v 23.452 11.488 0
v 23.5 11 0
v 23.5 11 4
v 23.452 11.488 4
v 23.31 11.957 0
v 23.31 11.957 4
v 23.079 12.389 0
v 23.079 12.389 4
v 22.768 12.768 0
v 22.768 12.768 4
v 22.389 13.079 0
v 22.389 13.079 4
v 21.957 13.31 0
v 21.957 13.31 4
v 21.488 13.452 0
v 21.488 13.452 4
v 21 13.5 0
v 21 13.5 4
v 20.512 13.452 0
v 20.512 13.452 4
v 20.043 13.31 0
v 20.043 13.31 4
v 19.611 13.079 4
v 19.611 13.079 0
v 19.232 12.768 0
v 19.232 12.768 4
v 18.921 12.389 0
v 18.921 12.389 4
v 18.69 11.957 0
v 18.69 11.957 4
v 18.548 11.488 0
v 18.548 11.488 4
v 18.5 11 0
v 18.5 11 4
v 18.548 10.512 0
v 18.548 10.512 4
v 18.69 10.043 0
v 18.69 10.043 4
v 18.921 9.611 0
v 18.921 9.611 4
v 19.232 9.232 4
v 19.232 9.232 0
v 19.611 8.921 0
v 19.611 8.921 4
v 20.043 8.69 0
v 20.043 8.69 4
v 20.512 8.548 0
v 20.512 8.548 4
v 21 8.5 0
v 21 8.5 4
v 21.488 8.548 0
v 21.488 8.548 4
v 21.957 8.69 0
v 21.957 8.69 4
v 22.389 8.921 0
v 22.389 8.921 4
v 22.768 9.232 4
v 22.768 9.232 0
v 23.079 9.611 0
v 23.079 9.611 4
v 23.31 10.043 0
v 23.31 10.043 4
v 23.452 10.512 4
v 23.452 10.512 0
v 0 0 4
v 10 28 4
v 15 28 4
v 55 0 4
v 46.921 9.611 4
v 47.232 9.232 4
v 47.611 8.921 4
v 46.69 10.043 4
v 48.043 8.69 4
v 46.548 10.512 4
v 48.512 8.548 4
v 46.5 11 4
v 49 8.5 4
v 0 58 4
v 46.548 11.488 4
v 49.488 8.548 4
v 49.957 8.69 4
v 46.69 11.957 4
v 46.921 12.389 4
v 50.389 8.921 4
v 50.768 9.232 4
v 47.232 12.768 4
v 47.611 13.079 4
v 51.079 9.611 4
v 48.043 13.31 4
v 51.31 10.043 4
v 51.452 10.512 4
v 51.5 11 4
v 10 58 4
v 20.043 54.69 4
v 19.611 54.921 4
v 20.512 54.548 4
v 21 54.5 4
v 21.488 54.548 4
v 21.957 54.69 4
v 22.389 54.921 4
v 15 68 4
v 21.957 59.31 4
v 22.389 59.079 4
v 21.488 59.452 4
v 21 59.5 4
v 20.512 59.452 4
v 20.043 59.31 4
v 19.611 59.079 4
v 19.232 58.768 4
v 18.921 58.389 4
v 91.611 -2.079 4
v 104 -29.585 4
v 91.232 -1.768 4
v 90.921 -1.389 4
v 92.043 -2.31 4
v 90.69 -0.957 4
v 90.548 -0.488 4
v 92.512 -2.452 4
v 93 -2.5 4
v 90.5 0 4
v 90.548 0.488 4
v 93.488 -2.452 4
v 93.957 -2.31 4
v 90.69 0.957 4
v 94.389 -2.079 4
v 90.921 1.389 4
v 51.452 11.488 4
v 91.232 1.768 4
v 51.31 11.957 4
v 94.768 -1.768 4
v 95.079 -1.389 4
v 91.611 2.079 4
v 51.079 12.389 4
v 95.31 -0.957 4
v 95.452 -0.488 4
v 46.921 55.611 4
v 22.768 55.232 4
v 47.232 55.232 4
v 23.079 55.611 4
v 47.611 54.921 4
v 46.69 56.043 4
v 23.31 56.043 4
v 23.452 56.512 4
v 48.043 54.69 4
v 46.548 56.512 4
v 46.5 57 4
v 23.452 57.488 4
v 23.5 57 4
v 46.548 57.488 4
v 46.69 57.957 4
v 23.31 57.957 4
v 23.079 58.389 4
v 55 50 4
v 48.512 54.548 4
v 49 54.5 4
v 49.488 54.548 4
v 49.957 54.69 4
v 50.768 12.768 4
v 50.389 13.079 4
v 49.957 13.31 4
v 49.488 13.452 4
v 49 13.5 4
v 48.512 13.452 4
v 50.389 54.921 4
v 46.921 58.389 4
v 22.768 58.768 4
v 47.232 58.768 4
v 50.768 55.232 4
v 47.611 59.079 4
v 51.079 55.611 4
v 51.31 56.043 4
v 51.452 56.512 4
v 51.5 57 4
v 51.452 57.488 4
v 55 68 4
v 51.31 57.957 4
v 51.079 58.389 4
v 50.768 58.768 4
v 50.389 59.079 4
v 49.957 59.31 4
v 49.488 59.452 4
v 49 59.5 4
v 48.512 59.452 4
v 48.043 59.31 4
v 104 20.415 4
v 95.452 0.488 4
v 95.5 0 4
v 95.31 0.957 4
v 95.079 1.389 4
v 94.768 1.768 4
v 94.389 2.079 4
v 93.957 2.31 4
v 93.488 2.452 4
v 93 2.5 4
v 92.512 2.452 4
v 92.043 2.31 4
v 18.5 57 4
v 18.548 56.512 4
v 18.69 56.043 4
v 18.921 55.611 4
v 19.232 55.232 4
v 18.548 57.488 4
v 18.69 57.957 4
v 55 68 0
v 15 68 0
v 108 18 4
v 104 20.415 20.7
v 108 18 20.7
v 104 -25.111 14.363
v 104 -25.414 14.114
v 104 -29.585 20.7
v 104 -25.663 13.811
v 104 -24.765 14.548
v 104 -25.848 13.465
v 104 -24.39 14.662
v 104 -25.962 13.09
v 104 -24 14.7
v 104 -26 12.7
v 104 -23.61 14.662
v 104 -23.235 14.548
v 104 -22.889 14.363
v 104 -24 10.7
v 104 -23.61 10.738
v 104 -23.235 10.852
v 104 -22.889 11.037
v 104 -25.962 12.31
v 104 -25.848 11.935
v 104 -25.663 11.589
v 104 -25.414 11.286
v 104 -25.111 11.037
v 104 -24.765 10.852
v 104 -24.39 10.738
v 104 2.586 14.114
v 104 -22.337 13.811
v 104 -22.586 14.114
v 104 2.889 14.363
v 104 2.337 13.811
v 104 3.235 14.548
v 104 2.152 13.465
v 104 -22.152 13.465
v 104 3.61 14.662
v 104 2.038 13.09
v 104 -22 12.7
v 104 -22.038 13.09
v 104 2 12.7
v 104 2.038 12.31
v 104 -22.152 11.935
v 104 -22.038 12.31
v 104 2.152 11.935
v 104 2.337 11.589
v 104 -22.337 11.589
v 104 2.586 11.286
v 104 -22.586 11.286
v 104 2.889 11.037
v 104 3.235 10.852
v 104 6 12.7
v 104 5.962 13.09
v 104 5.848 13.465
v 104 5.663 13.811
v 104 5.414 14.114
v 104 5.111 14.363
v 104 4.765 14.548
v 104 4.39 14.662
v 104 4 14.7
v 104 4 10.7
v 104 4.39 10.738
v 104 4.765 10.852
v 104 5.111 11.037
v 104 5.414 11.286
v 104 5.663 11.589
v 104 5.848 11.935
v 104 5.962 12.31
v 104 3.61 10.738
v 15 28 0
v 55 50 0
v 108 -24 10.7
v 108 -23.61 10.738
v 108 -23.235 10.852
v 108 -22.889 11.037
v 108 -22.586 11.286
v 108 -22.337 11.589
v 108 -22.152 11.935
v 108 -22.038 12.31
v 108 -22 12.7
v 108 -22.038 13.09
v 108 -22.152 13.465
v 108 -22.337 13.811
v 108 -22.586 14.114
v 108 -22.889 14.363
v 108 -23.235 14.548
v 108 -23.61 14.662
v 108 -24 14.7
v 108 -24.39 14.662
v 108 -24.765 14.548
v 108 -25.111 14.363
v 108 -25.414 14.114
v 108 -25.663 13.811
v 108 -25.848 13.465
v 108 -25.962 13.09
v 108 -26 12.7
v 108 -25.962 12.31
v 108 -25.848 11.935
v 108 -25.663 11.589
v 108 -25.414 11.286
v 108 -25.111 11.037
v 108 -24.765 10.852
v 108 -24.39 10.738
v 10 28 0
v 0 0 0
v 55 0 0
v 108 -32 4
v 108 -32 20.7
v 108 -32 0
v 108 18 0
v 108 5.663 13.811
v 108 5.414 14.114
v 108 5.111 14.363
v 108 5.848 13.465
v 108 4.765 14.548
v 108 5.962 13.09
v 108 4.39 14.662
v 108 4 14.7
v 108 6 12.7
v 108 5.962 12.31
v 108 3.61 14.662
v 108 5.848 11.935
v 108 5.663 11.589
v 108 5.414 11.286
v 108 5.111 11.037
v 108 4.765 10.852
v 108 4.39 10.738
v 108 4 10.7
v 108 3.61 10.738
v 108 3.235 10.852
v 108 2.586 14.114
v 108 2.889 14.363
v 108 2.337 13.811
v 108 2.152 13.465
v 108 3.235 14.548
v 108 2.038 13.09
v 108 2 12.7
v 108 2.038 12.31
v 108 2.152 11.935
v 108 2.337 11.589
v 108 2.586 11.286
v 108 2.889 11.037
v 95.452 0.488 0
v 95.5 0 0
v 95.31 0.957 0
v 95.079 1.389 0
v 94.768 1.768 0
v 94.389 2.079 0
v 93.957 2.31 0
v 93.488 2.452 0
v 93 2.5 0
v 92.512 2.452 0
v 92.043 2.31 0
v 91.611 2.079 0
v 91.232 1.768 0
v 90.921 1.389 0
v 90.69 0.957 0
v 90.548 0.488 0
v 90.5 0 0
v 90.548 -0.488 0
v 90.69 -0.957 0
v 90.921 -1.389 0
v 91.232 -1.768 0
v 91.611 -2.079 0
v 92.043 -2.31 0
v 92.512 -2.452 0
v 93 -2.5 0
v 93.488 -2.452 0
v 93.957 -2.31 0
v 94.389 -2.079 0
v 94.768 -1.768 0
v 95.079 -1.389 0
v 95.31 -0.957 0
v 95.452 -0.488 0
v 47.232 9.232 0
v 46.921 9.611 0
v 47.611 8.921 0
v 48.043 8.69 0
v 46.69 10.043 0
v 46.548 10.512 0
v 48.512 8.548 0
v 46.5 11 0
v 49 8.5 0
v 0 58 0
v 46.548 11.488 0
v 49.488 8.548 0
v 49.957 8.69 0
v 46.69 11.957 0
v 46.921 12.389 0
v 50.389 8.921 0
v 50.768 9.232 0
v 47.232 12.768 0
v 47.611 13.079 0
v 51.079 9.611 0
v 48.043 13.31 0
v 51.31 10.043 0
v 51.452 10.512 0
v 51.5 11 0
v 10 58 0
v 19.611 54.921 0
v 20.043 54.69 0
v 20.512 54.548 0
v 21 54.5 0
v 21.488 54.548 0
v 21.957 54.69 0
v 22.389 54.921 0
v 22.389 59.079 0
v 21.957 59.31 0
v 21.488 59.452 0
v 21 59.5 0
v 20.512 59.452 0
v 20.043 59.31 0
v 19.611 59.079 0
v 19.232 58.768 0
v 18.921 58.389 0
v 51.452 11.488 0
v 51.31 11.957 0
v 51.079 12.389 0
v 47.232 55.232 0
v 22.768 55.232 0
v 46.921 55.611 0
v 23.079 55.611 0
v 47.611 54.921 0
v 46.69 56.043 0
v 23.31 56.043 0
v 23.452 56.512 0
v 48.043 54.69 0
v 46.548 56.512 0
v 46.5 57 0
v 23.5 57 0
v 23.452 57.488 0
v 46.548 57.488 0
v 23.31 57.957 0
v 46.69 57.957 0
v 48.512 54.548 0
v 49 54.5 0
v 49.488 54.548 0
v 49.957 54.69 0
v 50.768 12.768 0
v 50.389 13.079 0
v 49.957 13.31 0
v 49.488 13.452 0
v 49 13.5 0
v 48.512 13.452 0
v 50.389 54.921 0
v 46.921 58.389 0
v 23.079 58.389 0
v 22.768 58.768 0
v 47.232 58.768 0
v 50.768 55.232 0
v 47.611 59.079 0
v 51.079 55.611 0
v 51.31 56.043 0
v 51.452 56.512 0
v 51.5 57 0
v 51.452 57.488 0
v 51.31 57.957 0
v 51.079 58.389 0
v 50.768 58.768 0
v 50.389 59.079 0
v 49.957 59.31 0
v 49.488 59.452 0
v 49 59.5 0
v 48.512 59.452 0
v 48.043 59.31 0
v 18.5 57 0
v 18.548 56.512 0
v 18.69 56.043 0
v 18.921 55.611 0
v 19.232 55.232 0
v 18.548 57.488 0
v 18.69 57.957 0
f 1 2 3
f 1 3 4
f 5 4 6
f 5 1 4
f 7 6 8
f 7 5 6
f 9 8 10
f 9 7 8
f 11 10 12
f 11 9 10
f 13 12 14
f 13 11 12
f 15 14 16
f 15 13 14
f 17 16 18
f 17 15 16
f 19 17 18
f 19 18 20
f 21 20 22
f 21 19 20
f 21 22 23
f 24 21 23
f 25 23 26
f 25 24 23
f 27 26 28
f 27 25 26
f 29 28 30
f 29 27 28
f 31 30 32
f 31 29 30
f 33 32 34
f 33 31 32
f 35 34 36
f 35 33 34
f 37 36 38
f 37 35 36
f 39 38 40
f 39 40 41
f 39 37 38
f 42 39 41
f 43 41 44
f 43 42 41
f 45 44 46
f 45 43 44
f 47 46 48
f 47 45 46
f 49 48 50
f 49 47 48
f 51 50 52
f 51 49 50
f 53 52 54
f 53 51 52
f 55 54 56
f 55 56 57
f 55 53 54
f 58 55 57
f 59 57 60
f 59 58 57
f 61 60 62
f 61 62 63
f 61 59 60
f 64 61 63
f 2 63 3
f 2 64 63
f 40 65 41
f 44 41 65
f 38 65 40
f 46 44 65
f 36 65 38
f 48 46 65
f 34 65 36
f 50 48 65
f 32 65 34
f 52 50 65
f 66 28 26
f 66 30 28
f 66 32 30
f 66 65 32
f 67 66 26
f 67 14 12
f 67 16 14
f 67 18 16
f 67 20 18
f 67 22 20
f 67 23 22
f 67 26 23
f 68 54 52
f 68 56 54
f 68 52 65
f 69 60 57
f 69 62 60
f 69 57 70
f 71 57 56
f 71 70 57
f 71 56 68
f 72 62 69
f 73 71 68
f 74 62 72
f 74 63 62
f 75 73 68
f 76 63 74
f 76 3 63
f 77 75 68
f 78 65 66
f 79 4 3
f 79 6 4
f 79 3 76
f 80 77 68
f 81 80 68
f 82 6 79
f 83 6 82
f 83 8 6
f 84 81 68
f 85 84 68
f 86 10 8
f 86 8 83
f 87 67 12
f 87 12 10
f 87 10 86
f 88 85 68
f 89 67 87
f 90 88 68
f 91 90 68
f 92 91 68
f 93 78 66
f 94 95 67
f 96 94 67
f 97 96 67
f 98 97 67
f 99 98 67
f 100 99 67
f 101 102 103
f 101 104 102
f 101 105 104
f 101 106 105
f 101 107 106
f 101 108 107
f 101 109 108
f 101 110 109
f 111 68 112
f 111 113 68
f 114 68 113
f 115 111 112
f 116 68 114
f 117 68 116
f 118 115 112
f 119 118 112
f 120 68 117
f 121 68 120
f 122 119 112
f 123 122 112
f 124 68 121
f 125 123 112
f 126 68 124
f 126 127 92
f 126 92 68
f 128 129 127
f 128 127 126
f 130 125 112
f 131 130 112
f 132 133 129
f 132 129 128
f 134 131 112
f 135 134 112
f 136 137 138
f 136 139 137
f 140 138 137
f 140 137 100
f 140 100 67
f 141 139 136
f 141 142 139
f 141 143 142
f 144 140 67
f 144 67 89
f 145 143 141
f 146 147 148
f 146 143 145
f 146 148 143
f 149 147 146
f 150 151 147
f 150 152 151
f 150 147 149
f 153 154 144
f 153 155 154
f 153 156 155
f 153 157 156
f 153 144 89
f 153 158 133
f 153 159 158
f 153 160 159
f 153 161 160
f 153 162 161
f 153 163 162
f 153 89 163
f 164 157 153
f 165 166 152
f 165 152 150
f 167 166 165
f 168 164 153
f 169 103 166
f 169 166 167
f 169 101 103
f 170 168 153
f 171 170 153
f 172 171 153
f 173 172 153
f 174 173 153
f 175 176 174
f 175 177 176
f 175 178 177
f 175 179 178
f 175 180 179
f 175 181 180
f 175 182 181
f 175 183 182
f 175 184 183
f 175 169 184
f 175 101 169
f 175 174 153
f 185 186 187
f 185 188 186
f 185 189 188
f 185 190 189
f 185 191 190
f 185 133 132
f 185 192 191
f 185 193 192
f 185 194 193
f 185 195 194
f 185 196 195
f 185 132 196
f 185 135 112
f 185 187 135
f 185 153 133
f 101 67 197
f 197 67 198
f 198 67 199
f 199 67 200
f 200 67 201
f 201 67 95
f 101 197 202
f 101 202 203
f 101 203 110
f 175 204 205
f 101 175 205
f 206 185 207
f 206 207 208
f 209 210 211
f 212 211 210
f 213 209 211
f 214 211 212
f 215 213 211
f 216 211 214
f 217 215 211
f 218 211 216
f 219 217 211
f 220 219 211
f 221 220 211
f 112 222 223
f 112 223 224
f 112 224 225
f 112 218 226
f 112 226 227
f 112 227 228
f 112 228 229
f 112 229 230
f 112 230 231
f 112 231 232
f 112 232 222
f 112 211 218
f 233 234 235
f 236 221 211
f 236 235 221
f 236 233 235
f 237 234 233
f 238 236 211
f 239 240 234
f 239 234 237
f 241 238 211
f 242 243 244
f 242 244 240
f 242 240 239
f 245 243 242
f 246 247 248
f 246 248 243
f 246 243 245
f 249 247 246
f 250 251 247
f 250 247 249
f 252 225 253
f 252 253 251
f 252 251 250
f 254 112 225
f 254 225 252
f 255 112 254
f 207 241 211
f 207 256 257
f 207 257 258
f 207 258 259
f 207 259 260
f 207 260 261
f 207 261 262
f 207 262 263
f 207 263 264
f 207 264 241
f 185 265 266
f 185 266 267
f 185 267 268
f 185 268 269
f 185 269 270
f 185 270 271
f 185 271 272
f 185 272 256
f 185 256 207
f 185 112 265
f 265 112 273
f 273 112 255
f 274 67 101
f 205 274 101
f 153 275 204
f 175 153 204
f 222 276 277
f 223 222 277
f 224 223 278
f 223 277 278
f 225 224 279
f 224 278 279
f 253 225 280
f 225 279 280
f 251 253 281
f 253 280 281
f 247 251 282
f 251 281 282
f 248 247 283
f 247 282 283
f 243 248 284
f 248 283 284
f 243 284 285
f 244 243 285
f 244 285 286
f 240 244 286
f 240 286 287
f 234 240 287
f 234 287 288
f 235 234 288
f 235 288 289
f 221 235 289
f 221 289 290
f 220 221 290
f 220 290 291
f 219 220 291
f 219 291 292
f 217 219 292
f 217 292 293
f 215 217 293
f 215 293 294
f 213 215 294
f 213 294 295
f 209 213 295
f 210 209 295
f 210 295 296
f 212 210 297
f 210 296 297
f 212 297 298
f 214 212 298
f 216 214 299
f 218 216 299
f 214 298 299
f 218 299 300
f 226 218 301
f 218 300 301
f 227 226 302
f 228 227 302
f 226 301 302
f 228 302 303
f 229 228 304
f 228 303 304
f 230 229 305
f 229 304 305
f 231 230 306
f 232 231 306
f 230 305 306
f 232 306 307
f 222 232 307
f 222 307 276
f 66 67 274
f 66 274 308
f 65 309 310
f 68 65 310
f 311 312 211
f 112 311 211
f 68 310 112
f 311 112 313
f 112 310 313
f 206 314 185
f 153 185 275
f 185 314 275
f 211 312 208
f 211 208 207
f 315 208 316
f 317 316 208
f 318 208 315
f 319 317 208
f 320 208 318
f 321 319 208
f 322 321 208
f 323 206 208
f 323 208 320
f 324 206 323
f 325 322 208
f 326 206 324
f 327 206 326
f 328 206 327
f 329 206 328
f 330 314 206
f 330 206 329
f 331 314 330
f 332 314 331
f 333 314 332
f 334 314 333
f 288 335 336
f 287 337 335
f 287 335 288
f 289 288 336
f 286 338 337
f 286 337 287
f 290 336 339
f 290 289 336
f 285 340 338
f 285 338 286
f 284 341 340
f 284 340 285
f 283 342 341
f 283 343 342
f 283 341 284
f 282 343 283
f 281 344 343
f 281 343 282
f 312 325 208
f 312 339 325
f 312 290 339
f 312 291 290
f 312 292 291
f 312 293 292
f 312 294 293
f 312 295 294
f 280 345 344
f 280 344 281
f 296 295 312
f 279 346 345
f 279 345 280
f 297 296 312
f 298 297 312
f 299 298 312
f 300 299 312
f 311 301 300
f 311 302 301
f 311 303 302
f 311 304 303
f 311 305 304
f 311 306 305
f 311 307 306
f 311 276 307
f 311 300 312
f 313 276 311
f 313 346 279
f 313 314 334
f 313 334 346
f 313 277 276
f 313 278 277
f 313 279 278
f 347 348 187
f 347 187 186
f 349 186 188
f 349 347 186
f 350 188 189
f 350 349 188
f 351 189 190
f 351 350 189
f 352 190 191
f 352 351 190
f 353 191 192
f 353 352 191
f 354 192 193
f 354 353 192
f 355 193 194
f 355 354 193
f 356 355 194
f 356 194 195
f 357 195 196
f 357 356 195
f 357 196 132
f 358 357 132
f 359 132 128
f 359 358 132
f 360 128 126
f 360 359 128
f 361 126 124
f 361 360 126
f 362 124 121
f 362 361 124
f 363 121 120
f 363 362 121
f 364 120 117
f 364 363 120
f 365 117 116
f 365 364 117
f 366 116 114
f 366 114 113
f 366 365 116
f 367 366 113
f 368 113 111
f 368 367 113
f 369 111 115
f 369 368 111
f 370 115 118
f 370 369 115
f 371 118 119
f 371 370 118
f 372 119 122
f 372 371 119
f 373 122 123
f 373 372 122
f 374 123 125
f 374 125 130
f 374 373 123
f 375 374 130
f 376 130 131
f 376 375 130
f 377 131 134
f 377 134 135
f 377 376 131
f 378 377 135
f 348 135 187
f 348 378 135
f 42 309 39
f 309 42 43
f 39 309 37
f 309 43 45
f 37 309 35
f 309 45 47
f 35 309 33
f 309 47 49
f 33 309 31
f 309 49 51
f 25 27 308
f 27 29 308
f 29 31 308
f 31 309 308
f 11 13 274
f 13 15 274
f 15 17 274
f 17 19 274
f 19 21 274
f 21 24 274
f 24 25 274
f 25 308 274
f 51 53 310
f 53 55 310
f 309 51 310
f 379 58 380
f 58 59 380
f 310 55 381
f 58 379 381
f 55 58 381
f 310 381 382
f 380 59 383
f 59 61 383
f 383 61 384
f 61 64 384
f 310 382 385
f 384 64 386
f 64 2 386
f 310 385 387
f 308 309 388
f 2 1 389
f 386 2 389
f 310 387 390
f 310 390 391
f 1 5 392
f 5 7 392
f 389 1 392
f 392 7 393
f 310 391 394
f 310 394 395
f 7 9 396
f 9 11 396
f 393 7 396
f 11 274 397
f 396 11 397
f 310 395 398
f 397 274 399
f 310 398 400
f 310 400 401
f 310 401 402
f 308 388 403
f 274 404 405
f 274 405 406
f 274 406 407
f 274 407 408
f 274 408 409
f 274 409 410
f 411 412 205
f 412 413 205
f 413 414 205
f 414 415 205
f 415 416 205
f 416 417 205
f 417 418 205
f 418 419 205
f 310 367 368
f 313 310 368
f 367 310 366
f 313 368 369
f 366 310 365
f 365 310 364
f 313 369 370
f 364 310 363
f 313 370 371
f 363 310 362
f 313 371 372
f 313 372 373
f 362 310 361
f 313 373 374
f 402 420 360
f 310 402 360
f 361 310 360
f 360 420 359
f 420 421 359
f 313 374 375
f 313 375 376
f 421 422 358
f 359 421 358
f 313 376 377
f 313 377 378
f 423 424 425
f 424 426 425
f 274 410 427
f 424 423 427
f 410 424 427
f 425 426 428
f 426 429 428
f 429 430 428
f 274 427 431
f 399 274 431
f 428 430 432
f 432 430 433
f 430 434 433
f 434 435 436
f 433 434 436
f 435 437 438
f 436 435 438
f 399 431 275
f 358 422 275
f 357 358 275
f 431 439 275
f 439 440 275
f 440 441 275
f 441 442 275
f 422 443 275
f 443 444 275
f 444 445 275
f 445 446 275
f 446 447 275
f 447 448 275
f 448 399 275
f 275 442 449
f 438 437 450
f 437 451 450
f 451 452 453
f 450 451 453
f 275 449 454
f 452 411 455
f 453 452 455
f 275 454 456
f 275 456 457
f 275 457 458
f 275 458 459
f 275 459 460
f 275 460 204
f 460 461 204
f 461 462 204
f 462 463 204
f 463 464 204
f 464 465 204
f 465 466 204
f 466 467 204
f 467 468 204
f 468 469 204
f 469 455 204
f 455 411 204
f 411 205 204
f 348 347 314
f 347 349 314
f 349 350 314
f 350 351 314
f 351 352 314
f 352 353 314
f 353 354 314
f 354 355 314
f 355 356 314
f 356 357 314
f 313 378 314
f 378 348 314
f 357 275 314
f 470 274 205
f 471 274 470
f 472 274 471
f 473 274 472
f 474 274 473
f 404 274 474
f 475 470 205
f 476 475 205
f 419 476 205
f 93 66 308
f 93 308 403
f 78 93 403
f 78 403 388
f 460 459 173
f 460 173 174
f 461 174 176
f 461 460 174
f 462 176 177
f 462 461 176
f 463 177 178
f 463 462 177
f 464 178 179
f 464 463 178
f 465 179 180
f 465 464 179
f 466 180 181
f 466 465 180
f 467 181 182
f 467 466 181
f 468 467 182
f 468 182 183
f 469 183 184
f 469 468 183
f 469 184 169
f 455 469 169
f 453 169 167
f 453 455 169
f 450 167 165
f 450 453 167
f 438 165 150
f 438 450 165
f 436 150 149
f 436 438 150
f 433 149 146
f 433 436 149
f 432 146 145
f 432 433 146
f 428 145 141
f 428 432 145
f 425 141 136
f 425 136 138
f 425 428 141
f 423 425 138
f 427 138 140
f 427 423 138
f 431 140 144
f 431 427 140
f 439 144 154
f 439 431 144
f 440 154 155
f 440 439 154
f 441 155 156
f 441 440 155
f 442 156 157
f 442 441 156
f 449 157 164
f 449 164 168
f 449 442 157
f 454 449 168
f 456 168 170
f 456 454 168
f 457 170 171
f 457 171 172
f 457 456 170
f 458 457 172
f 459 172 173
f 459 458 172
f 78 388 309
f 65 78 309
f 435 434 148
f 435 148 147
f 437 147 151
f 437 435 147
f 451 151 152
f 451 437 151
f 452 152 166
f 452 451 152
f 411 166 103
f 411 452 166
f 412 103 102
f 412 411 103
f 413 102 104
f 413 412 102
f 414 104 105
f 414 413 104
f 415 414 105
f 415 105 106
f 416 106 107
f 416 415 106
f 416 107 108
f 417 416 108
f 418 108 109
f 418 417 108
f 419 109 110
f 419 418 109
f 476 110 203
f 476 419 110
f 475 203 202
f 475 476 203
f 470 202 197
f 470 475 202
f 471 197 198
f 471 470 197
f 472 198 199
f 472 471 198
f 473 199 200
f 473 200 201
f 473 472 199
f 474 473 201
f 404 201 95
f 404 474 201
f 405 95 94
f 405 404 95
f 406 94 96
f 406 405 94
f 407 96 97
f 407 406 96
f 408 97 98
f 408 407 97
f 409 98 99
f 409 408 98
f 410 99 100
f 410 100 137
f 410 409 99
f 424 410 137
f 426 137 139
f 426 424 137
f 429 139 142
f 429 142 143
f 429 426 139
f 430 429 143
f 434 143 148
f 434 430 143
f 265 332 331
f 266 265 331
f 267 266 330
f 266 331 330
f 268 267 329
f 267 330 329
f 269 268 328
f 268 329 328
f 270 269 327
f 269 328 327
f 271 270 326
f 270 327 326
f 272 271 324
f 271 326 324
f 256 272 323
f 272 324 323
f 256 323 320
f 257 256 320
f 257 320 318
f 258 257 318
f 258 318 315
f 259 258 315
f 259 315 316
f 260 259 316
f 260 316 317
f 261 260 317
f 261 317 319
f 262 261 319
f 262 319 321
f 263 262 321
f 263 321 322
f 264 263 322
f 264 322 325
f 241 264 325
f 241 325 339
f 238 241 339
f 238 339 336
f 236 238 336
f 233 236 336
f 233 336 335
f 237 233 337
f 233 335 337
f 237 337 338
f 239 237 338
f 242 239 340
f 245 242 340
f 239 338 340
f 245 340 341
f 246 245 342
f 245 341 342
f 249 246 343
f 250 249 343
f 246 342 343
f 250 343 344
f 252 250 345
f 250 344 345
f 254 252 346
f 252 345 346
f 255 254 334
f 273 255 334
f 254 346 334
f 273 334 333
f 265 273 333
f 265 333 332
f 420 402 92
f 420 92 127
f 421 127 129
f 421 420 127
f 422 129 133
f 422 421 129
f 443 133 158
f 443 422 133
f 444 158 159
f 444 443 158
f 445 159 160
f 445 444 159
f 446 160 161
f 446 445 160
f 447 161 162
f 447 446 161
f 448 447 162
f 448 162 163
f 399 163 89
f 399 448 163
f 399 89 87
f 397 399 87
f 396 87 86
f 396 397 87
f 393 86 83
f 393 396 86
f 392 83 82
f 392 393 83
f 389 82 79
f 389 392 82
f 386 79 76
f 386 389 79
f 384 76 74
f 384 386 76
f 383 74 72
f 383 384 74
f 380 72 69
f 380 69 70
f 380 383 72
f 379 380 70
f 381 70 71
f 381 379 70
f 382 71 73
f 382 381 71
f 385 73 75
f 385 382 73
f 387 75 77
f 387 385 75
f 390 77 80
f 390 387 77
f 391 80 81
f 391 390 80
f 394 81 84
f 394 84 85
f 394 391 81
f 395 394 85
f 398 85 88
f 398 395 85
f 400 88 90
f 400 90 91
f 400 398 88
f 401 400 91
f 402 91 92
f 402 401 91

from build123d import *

# Parameters (mm, degrees)
SKETCH_1_R          = 2.5
EXTRUDE_1_DEPTH     = 4
EXTRUDE_2_DEPTH     = 16.7
SKETCH_3_R          = 2
CUT_EXTRUDE_1_DEPTH = 10
CUT_EXTRUDE_2_DEPTH = 10


with BuildPart() as part:
    # Эскиз1 → Бобышка-Вытянуть1 (new body)
    with BuildSketch(Plane.XY):
        Polygon((0, 0), (55, 0), (108, -32), (108, 0), (108, 18), (55, 50), (55, 68), (0, 68), align=None)
        with Locations((21, 57)):
            Circle(SKETCH_1_R, mode=Mode.SUBTRACT)
        with Locations((49, 57)):
            Circle(SKETCH_1_R, mode=Mode.SUBTRACT)
        with Locations((21, 11)):
            Circle(SKETCH_1_R, mode=Mode.SUBTRACT)
        with Locations((49, 11)):
            Circle(SKETCH_1_R, mode=Mode.SUBTRACT)
        with Locations((93, 0)):
            Circle(SKETCH_1_R, mode=Mode.SUBTRACT)
    extrude(amount=EXTRUDE_1_DEPTH)

    # Эскиз2 → Бобышка-Вытянуть2 (add)
    with BuildSketch(Plane.XY.offset(4)):
        Polygon((108, 18), (108, -32), (104, -29.58490566), (104, 20.41509434), align=None)
    extrude(amount=EXTRUDE_2_DEPTH)

    # Эскиз3 → Вырез-Вытянуть1 (cut)
    with BuildSketch(Plane(origin=(108, 0, 0), x_dir=(0, 0, -1), z_dir=(1, 0, 0))):
        with Locations((-12.7, 4)):
            Circle(SKETCH_3_R)
        with Locations((-12.7, -24)):
            Circle(SKETCH_3_R)
    extrude(amount=-CUT_EXTRUDE_1_DEPTH, mode=Mode.SUBTRACT)

    # Эскиз4 → Вырез-Вытянуть2 (cut)
    with BuildSketch(Plane.XY.offset(4)):
        Polygon((0, 68), (15, 68), (15, 58), (15, 28), (10, 28), (10, 58), (0, 58), align=None)
    extrude(amount=-CUT_EXTRUDE_2_DEPTH, mode=Mode.SUBTRACT)


solid = part.part
